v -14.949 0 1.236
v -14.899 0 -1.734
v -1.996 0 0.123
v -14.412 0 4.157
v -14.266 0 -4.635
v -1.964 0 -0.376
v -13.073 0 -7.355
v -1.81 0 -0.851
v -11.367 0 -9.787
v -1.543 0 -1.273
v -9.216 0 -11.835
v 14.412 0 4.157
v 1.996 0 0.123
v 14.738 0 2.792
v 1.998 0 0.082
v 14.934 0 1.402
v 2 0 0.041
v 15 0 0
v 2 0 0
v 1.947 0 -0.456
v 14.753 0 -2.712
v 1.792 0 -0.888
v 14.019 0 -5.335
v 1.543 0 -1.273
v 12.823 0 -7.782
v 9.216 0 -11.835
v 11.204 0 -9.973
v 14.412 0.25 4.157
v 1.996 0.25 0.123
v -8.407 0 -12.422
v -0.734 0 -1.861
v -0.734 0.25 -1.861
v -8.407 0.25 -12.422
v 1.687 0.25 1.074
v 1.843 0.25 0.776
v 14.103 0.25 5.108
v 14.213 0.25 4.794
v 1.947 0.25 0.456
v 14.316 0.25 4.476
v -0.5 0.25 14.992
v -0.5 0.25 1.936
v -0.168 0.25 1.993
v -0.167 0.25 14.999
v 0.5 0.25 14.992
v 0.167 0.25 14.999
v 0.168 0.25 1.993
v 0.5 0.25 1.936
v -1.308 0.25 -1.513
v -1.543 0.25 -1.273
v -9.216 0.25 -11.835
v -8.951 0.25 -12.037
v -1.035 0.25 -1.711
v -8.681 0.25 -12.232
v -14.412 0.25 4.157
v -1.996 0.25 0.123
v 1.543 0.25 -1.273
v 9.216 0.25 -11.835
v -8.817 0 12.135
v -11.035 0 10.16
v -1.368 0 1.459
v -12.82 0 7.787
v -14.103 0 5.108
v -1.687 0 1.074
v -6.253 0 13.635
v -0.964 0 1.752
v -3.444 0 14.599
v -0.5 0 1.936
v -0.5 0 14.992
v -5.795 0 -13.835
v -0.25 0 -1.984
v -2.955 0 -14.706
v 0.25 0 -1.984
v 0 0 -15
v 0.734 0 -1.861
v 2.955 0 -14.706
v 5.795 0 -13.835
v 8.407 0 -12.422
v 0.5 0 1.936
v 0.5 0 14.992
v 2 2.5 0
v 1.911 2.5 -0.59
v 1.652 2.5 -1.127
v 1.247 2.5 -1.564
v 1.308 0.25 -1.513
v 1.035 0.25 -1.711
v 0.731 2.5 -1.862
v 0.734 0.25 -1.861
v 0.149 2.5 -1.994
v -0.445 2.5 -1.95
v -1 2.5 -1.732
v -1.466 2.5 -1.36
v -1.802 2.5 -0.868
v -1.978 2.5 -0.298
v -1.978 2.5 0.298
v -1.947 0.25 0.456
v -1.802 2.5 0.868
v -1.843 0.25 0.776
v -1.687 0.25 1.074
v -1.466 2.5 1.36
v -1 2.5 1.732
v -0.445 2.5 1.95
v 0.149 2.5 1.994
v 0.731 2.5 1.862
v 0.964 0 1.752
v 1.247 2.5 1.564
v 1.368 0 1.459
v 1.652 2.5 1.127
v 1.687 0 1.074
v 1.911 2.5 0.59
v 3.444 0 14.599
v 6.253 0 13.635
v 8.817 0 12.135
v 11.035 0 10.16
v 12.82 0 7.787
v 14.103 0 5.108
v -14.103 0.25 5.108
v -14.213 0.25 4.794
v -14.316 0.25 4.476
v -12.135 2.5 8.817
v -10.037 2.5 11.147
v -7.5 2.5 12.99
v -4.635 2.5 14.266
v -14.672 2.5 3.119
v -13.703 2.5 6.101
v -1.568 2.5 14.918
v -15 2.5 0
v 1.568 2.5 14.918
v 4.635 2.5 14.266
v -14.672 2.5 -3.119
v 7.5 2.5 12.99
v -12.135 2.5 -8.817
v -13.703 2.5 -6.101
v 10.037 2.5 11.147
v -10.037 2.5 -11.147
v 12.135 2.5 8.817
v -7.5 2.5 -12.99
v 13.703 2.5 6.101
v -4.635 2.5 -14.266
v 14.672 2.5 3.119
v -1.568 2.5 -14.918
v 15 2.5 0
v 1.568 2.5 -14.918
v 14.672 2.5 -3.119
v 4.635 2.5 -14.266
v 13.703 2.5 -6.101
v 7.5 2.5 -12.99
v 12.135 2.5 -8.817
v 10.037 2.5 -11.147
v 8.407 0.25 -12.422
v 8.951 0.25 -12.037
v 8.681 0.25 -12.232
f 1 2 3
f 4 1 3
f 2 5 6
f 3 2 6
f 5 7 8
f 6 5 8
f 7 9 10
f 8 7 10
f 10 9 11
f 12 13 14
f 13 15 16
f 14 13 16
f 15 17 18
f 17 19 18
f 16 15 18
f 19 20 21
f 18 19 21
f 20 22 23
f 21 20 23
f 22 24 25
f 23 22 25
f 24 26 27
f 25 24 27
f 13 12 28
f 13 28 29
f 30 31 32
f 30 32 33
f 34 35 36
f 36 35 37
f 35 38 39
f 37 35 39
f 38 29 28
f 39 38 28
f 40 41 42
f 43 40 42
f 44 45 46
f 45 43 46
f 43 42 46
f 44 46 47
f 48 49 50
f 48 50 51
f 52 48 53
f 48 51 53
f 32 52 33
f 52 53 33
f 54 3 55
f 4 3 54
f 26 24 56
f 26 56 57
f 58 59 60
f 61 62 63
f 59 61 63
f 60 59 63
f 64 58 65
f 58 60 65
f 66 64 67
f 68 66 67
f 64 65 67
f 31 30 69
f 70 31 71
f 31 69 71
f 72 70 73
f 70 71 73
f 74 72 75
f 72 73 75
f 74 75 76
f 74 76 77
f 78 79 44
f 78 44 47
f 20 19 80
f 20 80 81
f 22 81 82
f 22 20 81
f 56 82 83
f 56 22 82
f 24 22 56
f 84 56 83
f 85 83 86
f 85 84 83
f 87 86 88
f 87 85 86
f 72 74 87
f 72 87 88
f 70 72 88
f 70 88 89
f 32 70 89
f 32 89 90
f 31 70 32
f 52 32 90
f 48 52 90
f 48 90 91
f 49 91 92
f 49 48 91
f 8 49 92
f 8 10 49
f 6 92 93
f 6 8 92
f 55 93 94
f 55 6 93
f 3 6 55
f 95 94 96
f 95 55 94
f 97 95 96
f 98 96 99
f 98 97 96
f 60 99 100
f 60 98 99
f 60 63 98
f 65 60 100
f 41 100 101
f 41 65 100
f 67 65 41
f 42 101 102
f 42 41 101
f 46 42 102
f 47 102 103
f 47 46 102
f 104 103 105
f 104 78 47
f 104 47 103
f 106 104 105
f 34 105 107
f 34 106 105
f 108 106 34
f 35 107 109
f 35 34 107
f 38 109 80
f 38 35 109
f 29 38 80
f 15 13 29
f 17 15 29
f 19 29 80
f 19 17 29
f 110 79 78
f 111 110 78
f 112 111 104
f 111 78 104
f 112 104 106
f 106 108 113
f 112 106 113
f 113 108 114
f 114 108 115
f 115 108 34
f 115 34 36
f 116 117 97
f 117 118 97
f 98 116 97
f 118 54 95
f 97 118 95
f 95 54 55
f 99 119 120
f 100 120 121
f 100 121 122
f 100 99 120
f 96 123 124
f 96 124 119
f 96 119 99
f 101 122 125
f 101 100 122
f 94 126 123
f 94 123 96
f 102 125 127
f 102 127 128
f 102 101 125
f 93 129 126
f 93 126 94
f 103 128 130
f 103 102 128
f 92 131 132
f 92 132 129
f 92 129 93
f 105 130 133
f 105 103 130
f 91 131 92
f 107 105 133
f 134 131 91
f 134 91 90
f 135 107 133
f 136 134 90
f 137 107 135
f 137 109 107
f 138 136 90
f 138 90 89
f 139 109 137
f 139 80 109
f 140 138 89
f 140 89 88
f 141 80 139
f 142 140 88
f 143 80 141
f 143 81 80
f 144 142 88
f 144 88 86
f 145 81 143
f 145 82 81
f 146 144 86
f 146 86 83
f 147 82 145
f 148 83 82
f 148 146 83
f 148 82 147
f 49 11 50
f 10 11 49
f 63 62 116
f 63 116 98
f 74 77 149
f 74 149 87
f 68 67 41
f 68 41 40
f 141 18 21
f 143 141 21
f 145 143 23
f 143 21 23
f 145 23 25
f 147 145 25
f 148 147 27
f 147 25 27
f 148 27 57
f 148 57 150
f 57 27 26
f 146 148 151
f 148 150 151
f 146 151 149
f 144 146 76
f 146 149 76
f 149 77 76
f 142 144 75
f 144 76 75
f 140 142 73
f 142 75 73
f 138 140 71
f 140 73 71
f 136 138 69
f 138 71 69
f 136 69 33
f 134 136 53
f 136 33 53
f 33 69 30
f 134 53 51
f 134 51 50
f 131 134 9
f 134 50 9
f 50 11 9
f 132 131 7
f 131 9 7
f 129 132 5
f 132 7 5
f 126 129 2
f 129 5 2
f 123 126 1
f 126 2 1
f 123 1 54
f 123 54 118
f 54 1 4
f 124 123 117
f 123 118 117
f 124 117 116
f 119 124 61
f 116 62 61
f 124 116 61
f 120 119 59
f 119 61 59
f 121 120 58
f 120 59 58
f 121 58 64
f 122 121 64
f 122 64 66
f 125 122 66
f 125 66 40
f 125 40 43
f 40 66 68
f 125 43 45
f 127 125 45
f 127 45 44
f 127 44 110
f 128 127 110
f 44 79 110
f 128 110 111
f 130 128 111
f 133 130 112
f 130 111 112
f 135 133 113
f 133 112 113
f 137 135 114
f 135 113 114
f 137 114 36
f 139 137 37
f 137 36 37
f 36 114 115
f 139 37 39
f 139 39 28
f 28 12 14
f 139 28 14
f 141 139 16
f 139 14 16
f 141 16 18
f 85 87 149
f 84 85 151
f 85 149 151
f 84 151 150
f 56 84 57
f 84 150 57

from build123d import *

# Parameters (mm, degrees)
SKETCH1_R           = 15
BOSS_EXTRUDE1_DEPTH = 2.5
CUT_EXTRUDE3_DEPTH  = 0.25
SKETCH3_R           = 2
CUT_EXTRUDE4_DEPTH  = 3.5


with BuildPart() as part:
    # Sketch1 → Boss-Extrude1 (new body)
    with BuildSketch(Plane(origin=(0, 0, 0), x_dir=(1, 0, 0), z_dir=(0, 1, 0))):
        Circle(SKETCH1_R)
    extrude(amount=BOSS_EXTRUDE1_DEPTH)

    # Sketch2 → Cut-Extrude3 (cut)
    with BuildSketch(Plane(origin=(0, 0, 0), x_dir=(1, 0, 0), z_dir=(0, 1, 0))):
        with BuildLine():
            Line((0, 0.850650808), (-8.412270287, 12.429147542))
            ThreePointArc((-8.412270287, 12.429147542), (-8.821675635, 12.141994852), (-9.221287282, 11.841362289))
            Line((-9.221287282, 11.841362289), (-0.809016994, 0.262865556))
            Line((-0.809016994, 0.262865556), (-14.420356242, -4.159726657))
            ThreePointArc((-14.420356242, -4.159726657), (-14.273771015, -4.637829342), (-14.111339247, -5.110783174))
            Line((-14.111339247, -5.110783174), (-0.5, -0.68819096))
            Line((-0.5, -0.68819096), (-0.5, -15))
            ThreePointArc((-0.5, -15), (0, -15.00833102), (0.5, -15))
            Line((0.5, -15), (0.5, -0.68819096))
            Line((0.5, -0.68819096), (14.111339247, -5.110783174))
            ThreePointArc((14.111339247, -5.110783174), (14.273771015, -4.637829342), (14.420356242, -4.159726657))
            Line((14.420356242, -4.159726657), (0.809016994, 0.262865556))
            Line((0.809016994, 0.262865556), (9.221287282, 11.841362289))
            ThreePointArc((9.221287282, 11.841362289), (8.821675635, 12.141994852), (8.412270287, 12.429147542))
            Line((8.412270287, 12.429147542), (0, 0.850650808))
        make_face()
    extrude(amount=CUT_EXTRUDE3_DEPTH, mode=Mode.SUBTRACT)

    # Sketch3 → Cut-Extrude4 (cut, through all)
    with BuildSketch(Plane(origin=(0, 0, 0), x_dir=(1, 0, 0), z_dir=(0, 1, 0))):
        Circle(SKETCH3_R)
    extrude(amount=CUT_EXTRUDE4_DEPTH, mode=Mode.SUBTRACT)


solid = part.part
